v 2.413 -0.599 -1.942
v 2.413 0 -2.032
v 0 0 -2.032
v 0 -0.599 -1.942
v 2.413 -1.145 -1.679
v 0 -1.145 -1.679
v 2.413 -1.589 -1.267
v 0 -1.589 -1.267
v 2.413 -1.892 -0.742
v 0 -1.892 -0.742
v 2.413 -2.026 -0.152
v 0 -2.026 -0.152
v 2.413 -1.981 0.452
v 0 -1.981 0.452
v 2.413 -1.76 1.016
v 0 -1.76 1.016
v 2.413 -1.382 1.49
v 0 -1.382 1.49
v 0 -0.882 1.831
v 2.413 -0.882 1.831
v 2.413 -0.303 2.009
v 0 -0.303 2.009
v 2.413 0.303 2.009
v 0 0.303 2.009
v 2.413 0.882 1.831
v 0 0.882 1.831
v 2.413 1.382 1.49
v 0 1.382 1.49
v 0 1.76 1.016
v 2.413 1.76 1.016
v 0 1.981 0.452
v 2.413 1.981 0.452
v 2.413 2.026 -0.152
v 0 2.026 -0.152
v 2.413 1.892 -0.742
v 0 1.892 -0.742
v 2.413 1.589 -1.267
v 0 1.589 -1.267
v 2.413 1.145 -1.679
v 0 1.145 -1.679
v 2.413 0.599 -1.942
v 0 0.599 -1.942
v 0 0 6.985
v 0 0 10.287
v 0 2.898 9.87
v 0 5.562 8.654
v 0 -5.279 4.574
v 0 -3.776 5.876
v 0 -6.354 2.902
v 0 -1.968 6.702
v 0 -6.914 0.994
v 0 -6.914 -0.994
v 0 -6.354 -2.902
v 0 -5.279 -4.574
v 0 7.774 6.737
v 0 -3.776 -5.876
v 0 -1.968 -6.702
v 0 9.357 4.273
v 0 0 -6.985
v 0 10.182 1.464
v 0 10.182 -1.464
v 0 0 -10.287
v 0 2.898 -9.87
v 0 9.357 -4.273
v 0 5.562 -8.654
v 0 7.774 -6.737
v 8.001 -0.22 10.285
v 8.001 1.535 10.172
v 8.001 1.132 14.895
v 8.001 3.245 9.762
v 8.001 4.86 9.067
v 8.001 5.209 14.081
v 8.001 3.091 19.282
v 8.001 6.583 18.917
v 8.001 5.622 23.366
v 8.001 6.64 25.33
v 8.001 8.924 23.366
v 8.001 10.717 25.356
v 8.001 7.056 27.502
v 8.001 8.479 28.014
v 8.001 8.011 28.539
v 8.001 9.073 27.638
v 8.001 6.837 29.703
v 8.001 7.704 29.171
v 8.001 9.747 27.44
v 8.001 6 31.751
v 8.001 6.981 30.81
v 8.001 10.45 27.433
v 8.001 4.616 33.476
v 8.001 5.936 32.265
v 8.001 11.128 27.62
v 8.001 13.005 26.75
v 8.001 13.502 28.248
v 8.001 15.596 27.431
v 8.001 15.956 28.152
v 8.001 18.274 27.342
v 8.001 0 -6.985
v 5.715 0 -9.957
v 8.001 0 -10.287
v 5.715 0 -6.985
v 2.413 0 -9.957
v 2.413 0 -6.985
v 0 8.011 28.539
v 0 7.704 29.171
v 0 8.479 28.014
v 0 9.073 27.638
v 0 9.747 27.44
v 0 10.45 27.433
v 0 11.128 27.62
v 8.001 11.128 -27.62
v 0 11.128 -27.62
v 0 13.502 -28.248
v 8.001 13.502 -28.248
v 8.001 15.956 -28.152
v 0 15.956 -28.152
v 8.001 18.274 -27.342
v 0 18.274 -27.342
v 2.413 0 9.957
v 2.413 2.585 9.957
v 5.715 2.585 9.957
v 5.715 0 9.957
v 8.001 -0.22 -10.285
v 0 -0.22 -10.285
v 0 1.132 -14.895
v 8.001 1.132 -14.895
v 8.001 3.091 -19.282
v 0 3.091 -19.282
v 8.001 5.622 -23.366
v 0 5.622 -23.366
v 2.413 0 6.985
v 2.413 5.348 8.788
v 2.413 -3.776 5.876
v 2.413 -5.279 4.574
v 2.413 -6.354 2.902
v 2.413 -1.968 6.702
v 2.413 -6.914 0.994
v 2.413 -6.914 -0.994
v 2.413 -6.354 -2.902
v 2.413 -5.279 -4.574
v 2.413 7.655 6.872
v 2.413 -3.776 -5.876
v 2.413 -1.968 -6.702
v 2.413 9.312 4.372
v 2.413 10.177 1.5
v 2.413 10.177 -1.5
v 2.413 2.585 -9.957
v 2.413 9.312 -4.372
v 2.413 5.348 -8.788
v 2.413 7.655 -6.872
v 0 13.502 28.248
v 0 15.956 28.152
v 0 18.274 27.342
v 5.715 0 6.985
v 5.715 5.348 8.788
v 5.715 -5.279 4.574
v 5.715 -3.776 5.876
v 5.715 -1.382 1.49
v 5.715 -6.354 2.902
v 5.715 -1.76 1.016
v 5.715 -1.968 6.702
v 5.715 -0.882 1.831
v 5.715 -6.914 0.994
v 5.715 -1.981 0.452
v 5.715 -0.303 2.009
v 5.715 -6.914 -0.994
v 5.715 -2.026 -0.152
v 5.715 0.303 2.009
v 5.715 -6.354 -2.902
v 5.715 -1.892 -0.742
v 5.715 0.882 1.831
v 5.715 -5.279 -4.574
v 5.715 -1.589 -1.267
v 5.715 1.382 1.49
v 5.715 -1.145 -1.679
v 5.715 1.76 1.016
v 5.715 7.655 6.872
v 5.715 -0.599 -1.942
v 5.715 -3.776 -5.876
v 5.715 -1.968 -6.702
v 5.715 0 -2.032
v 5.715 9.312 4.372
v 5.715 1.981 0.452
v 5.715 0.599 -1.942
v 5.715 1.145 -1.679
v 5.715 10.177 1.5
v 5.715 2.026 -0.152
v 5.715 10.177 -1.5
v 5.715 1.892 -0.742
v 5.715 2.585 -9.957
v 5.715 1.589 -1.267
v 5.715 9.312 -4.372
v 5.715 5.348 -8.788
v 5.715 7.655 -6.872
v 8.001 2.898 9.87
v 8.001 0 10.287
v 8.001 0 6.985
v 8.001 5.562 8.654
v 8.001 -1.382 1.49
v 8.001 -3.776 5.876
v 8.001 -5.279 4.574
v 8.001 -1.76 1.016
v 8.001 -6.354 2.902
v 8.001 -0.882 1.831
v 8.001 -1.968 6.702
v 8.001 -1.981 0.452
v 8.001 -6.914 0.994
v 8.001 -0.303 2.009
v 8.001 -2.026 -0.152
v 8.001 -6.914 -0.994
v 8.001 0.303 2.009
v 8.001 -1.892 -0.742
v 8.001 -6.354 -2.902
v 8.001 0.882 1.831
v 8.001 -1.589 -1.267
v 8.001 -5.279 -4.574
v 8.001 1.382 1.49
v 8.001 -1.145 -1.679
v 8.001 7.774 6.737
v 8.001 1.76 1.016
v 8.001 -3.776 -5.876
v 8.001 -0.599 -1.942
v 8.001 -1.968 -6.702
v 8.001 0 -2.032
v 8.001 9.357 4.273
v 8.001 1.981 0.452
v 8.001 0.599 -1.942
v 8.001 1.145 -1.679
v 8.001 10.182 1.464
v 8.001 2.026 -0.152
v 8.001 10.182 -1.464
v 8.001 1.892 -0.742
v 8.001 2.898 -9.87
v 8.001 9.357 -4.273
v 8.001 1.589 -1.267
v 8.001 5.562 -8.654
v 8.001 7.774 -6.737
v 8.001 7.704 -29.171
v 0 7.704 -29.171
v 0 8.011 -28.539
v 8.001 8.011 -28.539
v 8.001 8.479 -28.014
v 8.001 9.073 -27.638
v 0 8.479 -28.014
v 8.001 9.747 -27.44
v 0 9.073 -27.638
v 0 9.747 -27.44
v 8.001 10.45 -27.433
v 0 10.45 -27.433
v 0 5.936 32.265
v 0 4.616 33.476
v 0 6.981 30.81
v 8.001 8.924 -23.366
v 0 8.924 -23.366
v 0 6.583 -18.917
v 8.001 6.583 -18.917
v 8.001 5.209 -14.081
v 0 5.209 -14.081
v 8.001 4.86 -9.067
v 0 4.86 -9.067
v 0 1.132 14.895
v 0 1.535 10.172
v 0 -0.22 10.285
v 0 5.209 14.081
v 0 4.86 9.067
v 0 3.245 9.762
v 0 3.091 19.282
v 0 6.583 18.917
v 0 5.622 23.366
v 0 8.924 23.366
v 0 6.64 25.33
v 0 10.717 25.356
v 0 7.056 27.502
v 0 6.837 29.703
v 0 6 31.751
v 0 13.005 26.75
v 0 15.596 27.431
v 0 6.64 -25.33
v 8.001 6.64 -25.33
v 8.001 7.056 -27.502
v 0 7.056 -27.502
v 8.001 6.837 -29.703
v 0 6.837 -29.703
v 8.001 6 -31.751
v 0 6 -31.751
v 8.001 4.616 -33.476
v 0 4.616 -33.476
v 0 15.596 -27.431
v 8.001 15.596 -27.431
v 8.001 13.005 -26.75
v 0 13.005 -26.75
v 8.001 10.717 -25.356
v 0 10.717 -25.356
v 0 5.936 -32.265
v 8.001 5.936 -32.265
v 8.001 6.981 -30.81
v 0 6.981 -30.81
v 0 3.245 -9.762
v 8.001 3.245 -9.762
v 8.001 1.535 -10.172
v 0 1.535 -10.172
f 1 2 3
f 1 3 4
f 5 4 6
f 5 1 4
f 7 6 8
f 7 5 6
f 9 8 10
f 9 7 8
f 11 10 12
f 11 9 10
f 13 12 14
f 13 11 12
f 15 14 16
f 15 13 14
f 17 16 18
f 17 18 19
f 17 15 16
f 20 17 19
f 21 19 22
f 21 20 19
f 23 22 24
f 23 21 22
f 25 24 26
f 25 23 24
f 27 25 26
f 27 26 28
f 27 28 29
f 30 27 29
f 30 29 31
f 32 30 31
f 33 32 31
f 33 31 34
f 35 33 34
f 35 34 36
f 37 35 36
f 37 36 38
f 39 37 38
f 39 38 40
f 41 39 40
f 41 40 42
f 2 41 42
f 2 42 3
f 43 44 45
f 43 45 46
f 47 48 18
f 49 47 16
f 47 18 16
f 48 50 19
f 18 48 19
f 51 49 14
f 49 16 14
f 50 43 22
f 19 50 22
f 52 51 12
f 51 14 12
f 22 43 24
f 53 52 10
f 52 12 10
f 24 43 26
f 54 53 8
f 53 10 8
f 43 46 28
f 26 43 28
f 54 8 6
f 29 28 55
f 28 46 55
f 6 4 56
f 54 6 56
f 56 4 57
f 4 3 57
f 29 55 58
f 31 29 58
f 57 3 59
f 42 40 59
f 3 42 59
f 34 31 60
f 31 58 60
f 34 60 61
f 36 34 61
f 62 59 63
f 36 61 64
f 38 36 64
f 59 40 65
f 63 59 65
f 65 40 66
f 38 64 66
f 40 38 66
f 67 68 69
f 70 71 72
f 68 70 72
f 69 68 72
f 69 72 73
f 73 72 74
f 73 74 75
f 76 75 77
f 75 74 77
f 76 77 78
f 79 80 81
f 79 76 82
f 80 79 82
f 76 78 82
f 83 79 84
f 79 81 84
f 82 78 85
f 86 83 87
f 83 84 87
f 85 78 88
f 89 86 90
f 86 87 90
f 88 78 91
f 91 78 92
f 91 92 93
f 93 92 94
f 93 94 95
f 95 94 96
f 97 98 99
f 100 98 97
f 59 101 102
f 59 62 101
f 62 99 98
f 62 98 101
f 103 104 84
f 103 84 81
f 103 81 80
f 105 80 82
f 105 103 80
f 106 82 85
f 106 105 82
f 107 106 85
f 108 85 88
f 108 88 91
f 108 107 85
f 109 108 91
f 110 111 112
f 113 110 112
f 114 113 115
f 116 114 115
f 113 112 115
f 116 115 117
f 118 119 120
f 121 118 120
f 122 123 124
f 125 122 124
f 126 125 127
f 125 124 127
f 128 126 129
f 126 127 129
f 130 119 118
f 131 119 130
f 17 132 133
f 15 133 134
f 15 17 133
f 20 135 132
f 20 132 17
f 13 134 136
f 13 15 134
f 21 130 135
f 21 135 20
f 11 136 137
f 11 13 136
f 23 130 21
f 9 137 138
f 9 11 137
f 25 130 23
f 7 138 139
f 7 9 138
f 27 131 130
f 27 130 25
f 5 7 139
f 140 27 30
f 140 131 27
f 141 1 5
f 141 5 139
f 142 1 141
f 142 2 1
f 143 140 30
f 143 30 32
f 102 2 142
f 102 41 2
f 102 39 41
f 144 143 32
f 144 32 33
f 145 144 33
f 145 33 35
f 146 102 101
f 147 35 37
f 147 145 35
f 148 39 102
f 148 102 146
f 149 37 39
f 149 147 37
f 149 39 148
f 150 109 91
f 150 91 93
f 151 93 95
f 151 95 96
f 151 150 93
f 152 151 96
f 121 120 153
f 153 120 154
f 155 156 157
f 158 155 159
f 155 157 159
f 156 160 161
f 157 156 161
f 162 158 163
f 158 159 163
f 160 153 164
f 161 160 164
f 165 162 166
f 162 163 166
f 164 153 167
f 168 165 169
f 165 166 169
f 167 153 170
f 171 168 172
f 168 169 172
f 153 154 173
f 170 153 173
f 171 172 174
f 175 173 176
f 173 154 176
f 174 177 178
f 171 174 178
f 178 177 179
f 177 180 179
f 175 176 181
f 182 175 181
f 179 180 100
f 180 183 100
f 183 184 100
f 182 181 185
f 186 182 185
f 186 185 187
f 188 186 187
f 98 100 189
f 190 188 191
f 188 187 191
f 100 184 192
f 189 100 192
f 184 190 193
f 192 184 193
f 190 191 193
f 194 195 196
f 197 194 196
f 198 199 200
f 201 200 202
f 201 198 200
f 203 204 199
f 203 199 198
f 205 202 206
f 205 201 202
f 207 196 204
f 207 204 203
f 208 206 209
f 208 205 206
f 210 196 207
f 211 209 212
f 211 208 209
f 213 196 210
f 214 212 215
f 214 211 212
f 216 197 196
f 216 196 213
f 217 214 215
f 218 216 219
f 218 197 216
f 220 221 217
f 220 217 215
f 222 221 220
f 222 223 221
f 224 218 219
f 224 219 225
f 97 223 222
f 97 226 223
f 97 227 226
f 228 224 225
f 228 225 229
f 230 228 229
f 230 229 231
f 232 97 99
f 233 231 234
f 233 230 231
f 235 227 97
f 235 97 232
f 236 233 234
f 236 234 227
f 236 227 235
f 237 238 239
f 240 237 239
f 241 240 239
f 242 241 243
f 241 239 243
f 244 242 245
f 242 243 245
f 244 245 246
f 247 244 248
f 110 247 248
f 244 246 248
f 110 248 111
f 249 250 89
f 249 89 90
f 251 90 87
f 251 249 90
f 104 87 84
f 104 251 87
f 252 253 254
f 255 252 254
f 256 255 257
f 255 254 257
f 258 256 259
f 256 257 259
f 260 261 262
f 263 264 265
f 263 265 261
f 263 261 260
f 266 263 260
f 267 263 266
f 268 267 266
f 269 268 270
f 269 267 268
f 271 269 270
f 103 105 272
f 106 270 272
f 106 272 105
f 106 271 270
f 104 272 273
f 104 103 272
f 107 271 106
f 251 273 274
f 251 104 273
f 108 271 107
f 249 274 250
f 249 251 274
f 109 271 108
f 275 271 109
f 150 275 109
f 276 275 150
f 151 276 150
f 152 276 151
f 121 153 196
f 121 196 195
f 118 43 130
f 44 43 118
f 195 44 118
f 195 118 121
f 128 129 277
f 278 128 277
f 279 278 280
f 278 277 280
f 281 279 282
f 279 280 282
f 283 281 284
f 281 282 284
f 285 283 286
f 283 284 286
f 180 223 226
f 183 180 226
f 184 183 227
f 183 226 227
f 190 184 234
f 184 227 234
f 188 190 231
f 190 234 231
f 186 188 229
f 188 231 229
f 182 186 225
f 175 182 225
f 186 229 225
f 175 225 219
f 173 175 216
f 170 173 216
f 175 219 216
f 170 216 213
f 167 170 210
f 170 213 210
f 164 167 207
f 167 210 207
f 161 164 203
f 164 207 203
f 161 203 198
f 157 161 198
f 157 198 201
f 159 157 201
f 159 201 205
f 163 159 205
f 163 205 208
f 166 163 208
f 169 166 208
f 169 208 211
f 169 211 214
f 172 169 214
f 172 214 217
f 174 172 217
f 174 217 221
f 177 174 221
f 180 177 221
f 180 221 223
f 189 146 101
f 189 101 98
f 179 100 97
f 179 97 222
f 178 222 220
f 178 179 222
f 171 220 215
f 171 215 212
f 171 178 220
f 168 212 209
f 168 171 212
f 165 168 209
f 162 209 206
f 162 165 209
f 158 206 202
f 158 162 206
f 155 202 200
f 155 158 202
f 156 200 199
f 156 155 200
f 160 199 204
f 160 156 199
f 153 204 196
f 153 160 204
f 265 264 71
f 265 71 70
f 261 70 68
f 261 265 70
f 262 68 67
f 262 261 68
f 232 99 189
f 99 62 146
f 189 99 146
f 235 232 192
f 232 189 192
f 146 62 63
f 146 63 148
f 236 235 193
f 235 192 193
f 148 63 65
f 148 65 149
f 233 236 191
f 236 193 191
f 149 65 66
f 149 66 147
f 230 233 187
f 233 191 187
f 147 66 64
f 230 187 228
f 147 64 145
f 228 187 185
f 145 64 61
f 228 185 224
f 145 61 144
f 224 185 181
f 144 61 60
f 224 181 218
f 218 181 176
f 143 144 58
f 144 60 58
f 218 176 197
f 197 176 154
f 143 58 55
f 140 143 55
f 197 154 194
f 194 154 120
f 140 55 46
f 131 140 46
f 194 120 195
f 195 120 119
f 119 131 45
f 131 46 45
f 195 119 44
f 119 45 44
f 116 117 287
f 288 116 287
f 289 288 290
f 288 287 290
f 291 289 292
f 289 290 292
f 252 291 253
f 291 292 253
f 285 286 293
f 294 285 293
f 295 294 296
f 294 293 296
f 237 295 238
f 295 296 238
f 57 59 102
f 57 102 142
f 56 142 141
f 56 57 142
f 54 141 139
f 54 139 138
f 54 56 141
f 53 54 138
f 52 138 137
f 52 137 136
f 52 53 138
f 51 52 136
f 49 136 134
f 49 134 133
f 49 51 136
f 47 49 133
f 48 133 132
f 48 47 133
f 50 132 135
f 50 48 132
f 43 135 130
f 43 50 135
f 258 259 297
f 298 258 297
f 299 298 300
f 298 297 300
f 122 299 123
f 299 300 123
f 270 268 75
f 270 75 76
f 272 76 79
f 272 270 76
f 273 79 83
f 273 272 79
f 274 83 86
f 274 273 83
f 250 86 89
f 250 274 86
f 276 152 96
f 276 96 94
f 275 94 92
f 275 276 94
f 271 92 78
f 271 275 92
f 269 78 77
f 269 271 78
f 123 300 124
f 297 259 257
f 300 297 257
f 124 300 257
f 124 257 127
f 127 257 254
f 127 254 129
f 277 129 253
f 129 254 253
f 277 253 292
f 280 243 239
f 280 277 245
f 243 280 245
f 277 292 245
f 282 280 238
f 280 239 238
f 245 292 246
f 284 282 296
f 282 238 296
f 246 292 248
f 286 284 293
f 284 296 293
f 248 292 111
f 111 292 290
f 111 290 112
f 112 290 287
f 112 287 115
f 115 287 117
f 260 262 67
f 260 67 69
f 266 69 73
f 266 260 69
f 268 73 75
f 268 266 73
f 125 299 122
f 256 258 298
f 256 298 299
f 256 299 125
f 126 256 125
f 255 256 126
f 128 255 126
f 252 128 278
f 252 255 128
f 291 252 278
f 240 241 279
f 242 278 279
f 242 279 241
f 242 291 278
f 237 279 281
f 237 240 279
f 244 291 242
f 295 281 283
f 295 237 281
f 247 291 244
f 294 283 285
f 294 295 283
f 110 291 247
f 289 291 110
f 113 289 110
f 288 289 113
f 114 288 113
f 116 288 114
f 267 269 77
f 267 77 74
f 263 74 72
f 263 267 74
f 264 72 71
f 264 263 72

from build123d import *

# Parameters (mm, degrees)
SKETCH1_R           = 10.287
BOSS_EXTRUDE1_DEPTH = 8.001
SKETCH2_R           = 2.032
CUT_EXTRUDE1_DEPTH  = 3.7338
CUT_EXTRUDE2_START  = -3.7338
SKETCH3_R           = 2.032
CUT_EXTRUDE2_DEPTH  = 3.7338
BOSS_EXTRUDE2_DEPTH = 8.001
CUT_EXTRUDE3_START  = -8.001
CUT_EXTRUDE3_DEPTH  = 8.001
SKETCH6_W           = 3.302
SKETCH6_H           = 19.9136
CUT_EXTRUDE4_DEPTH  = 39.509209906


with BuildPart() as part:
    # Sketch1 → Boss-Extrude1 (new body)
    with BuildSketch(Plane(origin=(0, 0, 0), x_dir=(0, 0, -1), z_dir=(1, 0, 0))):
        Circle(SKETCH1_R)
    extrude(amount=BOSS_EXTRUDE1_DEPTH)

    # Sketch2 → Cut-Extrude1 (cut)
    with BuildSketch(Plane(origin=(8.001, 0, 0), x_dir=(0, 0, -1), z_dir=(1, 0, 0))):
        Circle(SKETCH2_R)
    extrude(amount=-CUT_EXTRUDE1_DEPTH, mode=Mode.SUBTRACT)

    # Sketch3 → Cut-Extrude2 (cut)
    with BuildSketch(Plane.ZY.offset(CUT_EXTRUDE2_START)):
        with Locations(Location((0, 0, 0), (0, 0, 180))):
            Circle(SKETCH3_R)
    extrude(amount=CUT_EXTRUDE2_DEPTH, mode=Mode.SUBTRACT)

    # Sketch5 → Cut-Extrude3 (cut)
    with BuildSketch(Plane(origin=(8.001, 0, 0), x_dir=(0, 0, -1), z_dir=(1, 0, 0)).offset(CUT_EXTRUDE3_START)):
        with BuildLine():
            Line((-6.985, 0), (-10.287, 0))
            ThreePointArc((-10.287, 0), (0, -10.287), (10.287, 0))
            Line((10.287, 0), (6.985, 0))
            ThreePointArc((6.985, 0), (0, -6.985), (-6.985, 0))
        make_face()
    extrude(amount=CUT_EXTRUDE3_DEPTH, mode=Mode.SUBTRACT)

    # Sketch6 → Cut-Extrude4 (cut, through all)
    with BuildSketch(Plane(origin=(0, 10.287, 0), x_dir=(1, 0, 0), z_dir=(0, 1, 0))):
        with Locations((4.064, 0)):
            Rectangle(SKETCH6_W, SKETCH6_H)
    extrude(amount=-CUT_EXTRUDE4_DEPTH, mode=Mode.SUBTRACT)


with BuildPart() as body_2:
    # Sketch4 → Boss-Extrude2 (new body)
    with BuildSketch(Plane.ZY):
        with BuildLine():
            ThreePointArc((9.066535783, 4.860071799), (10.003433712, 2.398683591), (10.284648783, -0.219928201))
            ThreePointArc((10.284648783, -0.219928201), (17.121583704, 2.037315344), (23.365648783, 5.622071799))
            ThreePointArc((23.365648783, 5.622071799), (28.610506662, 7.025976389), (33.475681659, 4.615674643))
            ThreePointArc((33.475681659, 4.615674643), (31.564768671, 6.496206487), (29.171267322, 7.704155061))
            ThreePointArc((29.171267322, 7.704155061), (27.638389928, 9.072717296), (27.619726913, 11.127547555))
            ThreePointArc((27.619726913, 11.127547555), (28.291483716, 14.73214833), (27.341838119, 18.273698442))
            ThreePointArc((27.341838119, 18.273698442), (26.750112425, 13.005040292), (23.365648783, 8.924071799))
            ThreePointArc((23.365648783, 8.924071799), (16.53490074, 5.770349813), (9.066535783, 4.860071799))
        make_face()
    extrude(amount=-BOSS_EXTRUDE2_DEPTH)


with BuildPart() as body_3:
    # Mirror3: mirrored copy
    add(body_2.part.mirror(Plane.XY))


solid = Compound([part.part, body_2.part, body_3.part])
